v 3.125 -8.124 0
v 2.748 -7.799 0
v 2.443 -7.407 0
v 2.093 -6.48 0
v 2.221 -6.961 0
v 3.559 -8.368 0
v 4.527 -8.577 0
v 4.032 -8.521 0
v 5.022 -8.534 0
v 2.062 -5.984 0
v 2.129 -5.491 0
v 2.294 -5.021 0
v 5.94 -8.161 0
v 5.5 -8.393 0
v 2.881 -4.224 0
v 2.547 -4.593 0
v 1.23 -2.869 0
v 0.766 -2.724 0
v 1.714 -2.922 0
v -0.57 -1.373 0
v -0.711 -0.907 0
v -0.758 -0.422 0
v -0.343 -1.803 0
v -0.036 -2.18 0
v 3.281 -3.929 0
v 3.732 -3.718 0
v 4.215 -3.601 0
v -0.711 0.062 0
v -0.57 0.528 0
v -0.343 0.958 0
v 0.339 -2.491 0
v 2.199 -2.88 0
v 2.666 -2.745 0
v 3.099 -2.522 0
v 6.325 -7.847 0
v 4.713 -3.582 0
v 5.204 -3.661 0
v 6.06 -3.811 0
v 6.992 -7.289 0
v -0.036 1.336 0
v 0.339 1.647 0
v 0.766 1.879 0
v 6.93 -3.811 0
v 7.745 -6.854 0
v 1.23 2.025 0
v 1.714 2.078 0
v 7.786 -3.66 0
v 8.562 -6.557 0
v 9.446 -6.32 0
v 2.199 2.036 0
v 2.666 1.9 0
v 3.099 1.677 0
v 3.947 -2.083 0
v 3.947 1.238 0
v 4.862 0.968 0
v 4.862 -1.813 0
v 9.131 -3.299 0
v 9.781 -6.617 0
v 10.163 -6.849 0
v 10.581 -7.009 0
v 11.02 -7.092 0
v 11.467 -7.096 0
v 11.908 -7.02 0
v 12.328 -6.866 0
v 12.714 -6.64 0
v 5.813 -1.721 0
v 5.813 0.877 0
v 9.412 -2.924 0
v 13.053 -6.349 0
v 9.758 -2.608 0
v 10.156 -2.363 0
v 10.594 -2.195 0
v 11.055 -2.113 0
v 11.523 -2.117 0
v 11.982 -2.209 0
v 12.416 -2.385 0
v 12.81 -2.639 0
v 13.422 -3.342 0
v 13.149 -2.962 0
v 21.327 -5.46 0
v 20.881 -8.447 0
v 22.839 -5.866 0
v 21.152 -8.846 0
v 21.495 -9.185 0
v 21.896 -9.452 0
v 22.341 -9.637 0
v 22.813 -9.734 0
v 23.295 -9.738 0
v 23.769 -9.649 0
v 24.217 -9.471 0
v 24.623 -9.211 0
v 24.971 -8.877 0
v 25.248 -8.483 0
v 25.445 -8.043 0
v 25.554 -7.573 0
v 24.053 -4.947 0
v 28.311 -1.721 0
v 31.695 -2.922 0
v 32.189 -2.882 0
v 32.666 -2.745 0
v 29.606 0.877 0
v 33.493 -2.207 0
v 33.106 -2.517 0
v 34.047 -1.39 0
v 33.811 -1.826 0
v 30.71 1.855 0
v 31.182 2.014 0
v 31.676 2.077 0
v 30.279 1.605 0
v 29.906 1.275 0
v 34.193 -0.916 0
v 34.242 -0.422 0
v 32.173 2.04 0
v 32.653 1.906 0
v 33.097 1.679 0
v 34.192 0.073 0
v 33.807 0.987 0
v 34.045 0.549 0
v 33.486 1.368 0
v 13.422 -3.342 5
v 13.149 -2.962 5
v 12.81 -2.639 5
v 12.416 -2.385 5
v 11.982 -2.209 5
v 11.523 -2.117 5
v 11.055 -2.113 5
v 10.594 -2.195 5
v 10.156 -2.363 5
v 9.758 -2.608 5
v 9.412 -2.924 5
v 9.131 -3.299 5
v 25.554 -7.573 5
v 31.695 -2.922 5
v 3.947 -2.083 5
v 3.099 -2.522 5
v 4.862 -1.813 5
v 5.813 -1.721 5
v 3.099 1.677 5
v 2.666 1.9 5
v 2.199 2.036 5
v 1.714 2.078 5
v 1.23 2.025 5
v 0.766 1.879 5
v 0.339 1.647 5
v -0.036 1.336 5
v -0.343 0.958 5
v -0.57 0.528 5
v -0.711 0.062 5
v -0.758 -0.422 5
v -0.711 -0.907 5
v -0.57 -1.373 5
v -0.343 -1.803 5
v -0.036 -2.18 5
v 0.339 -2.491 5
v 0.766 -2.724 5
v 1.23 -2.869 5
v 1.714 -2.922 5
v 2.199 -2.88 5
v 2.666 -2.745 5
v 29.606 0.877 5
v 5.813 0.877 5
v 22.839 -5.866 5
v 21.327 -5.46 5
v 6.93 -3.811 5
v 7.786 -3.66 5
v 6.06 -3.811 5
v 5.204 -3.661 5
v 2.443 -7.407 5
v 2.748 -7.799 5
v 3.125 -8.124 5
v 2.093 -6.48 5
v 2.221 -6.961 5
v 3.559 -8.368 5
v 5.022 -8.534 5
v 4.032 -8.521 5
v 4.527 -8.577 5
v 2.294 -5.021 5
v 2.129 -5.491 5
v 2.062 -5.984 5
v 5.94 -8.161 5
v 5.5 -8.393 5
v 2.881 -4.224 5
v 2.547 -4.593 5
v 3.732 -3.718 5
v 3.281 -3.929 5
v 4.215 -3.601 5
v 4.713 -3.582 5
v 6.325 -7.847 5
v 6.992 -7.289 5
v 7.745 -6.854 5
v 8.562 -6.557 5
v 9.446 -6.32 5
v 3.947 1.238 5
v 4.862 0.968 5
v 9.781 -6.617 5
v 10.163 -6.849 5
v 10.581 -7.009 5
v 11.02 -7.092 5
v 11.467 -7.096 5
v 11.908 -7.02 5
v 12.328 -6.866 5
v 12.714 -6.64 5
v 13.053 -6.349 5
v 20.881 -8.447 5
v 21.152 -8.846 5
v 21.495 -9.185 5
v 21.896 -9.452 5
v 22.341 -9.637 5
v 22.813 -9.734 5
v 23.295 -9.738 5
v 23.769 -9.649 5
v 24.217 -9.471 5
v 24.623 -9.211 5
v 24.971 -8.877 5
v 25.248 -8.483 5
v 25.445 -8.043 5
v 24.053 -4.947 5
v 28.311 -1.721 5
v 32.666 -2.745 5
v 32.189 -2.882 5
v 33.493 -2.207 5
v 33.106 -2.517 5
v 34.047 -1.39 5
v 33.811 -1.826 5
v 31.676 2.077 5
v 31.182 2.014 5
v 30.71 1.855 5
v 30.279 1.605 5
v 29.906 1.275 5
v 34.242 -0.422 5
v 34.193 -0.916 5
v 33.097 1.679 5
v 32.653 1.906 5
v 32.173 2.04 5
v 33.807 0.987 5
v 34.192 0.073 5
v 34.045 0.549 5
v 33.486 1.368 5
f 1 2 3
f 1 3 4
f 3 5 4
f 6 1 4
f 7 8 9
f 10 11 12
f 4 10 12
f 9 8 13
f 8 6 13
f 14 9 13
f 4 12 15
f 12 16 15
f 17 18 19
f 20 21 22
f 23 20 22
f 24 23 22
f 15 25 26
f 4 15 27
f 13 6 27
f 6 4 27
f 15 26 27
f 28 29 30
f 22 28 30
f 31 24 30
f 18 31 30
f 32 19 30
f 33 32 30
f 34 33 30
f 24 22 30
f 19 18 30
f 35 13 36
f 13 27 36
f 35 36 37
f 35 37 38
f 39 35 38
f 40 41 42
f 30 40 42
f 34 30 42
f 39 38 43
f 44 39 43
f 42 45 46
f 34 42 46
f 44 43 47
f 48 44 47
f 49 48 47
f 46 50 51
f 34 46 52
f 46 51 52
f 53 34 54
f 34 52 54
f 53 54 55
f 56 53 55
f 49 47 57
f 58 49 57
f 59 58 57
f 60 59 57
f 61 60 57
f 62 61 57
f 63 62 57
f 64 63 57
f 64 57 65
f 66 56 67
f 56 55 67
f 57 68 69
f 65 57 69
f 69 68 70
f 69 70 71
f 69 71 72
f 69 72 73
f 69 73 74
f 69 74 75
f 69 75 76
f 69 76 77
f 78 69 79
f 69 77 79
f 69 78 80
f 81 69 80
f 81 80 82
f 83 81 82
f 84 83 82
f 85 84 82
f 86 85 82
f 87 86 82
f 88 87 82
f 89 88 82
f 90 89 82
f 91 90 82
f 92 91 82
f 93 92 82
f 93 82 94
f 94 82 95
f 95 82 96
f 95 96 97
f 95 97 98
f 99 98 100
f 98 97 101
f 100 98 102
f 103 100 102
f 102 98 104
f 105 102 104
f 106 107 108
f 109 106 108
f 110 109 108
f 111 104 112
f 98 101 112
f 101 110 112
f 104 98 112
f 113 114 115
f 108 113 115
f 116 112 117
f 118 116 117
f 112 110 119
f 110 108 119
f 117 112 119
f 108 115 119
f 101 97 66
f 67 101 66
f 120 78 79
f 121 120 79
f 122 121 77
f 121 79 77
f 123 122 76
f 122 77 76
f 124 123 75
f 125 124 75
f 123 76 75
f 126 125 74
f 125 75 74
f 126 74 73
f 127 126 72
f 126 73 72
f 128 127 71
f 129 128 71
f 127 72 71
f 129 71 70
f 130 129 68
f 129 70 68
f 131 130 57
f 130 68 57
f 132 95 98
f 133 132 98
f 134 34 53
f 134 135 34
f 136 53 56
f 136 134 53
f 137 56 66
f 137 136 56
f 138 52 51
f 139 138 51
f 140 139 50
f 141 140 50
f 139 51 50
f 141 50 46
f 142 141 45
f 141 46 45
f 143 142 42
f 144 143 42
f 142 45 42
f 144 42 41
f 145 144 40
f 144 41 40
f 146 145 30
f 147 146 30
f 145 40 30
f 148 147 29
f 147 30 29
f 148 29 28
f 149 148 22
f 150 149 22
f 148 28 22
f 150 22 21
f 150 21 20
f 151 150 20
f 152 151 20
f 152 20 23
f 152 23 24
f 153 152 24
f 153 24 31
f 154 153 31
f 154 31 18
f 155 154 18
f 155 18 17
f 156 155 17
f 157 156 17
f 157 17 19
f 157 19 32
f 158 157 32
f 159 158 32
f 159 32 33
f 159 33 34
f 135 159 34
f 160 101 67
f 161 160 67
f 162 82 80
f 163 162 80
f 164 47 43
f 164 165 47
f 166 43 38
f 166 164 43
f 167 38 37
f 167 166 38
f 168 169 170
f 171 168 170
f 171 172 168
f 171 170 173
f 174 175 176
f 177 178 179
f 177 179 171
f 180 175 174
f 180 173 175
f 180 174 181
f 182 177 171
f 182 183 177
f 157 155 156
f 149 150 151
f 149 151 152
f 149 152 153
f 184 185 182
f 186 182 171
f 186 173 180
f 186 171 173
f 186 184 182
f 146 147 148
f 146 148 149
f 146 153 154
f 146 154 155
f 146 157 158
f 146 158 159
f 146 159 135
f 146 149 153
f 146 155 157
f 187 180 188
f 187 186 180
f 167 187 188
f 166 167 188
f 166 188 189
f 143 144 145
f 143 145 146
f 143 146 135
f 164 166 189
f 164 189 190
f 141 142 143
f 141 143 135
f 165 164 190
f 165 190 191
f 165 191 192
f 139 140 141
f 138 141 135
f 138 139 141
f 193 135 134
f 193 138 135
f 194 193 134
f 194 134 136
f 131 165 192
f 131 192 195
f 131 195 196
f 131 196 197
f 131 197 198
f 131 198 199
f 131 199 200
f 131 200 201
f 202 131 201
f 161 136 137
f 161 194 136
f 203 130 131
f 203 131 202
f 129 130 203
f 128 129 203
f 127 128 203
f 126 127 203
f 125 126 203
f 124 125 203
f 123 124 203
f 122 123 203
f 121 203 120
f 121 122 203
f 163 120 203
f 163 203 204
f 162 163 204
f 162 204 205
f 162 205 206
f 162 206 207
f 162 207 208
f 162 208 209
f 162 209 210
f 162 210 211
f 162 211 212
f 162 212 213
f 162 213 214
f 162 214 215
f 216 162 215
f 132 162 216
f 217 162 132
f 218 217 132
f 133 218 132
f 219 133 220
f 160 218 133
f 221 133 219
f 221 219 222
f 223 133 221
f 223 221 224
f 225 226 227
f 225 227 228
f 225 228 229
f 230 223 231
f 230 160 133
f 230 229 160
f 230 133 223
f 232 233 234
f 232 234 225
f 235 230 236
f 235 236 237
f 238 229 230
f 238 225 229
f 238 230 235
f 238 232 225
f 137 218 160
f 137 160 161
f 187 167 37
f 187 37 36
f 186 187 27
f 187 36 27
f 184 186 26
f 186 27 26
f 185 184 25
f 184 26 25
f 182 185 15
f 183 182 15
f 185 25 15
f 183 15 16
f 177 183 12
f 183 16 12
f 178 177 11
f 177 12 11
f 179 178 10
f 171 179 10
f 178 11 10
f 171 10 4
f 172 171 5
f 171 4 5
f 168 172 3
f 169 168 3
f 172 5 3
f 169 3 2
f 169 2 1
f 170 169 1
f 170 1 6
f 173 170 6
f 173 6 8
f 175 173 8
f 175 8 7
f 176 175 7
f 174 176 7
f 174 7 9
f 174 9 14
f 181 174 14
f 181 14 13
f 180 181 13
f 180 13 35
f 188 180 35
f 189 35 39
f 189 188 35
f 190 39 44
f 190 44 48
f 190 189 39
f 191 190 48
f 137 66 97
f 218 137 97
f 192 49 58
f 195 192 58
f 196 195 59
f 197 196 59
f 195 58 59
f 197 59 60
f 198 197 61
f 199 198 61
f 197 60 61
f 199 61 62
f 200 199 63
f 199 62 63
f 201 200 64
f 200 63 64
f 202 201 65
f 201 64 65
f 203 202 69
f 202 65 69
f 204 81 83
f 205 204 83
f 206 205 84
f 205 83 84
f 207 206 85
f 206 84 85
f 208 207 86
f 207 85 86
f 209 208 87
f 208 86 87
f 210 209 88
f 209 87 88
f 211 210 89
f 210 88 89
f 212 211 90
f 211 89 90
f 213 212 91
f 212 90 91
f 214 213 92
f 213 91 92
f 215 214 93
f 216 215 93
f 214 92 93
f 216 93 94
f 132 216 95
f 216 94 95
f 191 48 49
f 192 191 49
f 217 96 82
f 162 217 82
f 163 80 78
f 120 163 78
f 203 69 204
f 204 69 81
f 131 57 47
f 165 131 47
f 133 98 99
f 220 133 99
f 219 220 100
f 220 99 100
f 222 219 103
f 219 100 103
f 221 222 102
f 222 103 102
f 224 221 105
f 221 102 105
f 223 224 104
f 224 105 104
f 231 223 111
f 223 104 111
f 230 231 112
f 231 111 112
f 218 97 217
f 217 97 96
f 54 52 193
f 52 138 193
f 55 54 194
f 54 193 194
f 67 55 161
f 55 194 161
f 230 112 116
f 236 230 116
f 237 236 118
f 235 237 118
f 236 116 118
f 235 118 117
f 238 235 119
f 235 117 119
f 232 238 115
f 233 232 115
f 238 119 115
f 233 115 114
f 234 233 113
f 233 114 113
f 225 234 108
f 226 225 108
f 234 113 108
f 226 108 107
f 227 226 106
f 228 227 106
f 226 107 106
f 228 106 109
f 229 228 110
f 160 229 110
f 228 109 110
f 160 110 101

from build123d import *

# Parameters (mm, degrees)
F1_DEPTH = 5
F2_DEPTH = 5
F3_R     = 5


with BuildPart() as f1:
    # F0 (on Top) → F1 (new body)
    with BuildSketch(Plane.XY):
        with BuildLine():
            ThreePointArc((3.8778323824, 0.876766336), (4.1491402261, 0.2522371821), (4.2418691481, -0.4223337609))
            ThreePointArc((4.2418691481, -0.4223337609), (4.1491402261, -1.0969047038), (3.8778323824, -1.7214338577))
            Line((3.8778323824, -1.7214338577), (28.311316439, -1.7214338577))
            Line((28.311316439, -1.7214338577), (29.302722756, -0.9705717363))
            ThreePointArc((29.302722756, -0.9705717363), (29.2748726925, -0.0174529288), (29.6059059138, 0.876766336))
            Line((29.6059059138, 0.876766336), (3.8778323824, 0.876766336))
        make_face()
        with BuildLine():
            ThreePointArc((34.2418691481, -0.4223337609), (32.4164400911, 1.9849373171), (29.6059059138, 0.876766336))
            Line((29.6059059138, 0.876766336), (31.7418691481, 0.876766336))
            Line((31.7418691481, 0.876766336), (33.5531306582, -1.5147461023))
            Line((33.5531306582, -1.5147461023), (31.6951874639, -2.921897887))
            ThreePointArc((31.6951874639, -2.921897887), (33.4930538599, -2.206528847), (34.2418691481, -0.4223337609))
        make_face()
        with BuildLine():
            Line((33.5531306582, -1.5147461023), (31.7418691481, 0.876766336))
            Line((31.7418691481, 0.876766336), (31.7418691481, -1.7214338577))
            Line((31.7418691481, -1.7214338577), (29.6059059138, -1.7214338577))
            ThreePointArc((29.6059059138, -1.7214338577), (30.4963719858, -2.5899907491), (31.6951874639, -2.921897887))
            Line((31.6951874639, -2.921897887), (33.5531306582, -1.5147461023))
        make_face()
        with BuildLine():
            Line((31.7418691481, 0.876766336), (29.6059059138, 0.876766336))
            ThreePointArc((29.6059059138, 0.876766336), (29.2748726925, -0.0174529288), (29.302722756, -0.9705717363))
            Line((29.302722756, -0.9705717363), (31.7418691481, 0.876766336))
        make_face()
        with BuildLine():
            Line((31.7418691481, -1.7214338577), (31.7418691481, 0.876766336))
            Line((31.7418691481, 0.876766336), (29.302722756, -0.9705717363))
            ThreePointArc((29.302722756, -0.9705717363), (29.4237113655, -1.358359666), (29.6059059138, -1.7214338577))
            Line((29.6059059138, -1.7214338577), (31.7418691481, -1.7214338577))
        make_face()
        with BuildLine():
            Line((29.6059059138, -1.7214338577), (28.311316439, -1.7214338577))
            Line((28.311316439, -1.7214338577), (24.0527407032, -4.9467544517))
            ThreePointArc((24.0527407032, -4.9467544517), (25.1599747934, -5.8682005046), (25.5749808252, -7.2476207279))
            ThreePointArc((25.5749808252, -7.2476207279), (25.569649156, -7.4108074897), (25.5536768898, -7.5732982052))
            Line((25.5536768898, -7.5732982052), (31.6951874639, -2.921897887))
            ThreePointArc((31.6951874639, -2.921897887), (30.4963719858, -2.5899907491), (29.6059059138, -1.7214338577))
        make_face()
        with BuildLine():
            Line((29.302722756, -0.9705717363), (28.311316439, -1.7214338577))
            Line((28.311316439, -1.7214338577), (29.6059059138, -1.7214338577))
            ThreePointArc((29.6059059138, -1.7214338577), (29.4237113655, -1.358359666), (29.302722756, -0.9705717363))
        make_face()
        with BuildLine():
            ThreePointArc((25.5749808252, -7.2476207279), (25.1599747934, -5.8682005046), (24.0527407032, -4.9467544517))
            Line((24.0527407032, -4.9467544517), (22.8393681886, -5.8657272732))
            Line((22.8393681886, -5.8657272732), (24.2570694169, -6.2455991724))
            Line((24.2570694169, -6.2455991724), (23.4806122816, -9.1433766513))
            Line((23.4806122816, -9.1433766513), (25.5536768898, -7.5732982052))
            ThreePointArc((25.5536768898, -7.5732982052), (25.569649156, -7.4108074897), (25.5749808252, -7.2476207279))
        make_face()
        with BuildLine():
            ThreePointArc((20.8814307518, -8.4469280594), (23.5344743938, -9.7050310844), (25.5536768898, -7.5732982052))
            Line((25.5536768898, -7.5732982052), (23.4806122816, -9.1433766513))
            Line((23.4806122816, -9.1433766513), (20.8814307518, -8.4469280594))
        make_face()
        with BuildLine():
            Line((21.6693507715, -6.751864213), (22.8393681886, -5.8657272732))
            Line((22.8393681886, -5.8657272732), (21.3268372671, -5.4604458343))
            ThreePointArc((21.3268372671, -5.4604458343), (20.6023291733, -6.8788473441), (20.8814307518, -8.4469280594))
            Line((20.8814307518, -8.4469280594), (23.4806122816, -9.1433766513))
            Line((23.4806122816, -9.1433766513), (21.6693507715, -6.751864213))
        make_face()
        Polygon((24.2570694169, -6.2455991724), (22.8393681886, -5.8657272732), (21.6693507715, -6.751864213), (23.4806122816, -9.1433766513), align=None)
        with BuildLine():
            ThreePointArc((20.8814307518, -8.4469280594), (20.6023291733, -6.8788473441), (21.3268372671, -5.4604458343))
            Line((21.3268372671, -5.4604458343), (13.4219767307, -3.3423448372))
            ThreePointArc((13.4219767307, -3.3423448372), (13.6767457968, -3.9504448184), (13.7636843696, -4.6040001325))
            ThreePointArc((13.7636843696, -4.6040001325), (13.5793417545, -5.5461948448), (13.0534996689, -6.3494402473))
            Line((13.0534996689, -6.3494402473), (20.8814307518, -8.4469280594))
        make_face()
        with BuildLine():
            ThreePointArc((13.7636843696, -4.6040001325), (13.6767457968, -3.9504448184), (13.4219767307, -3.3423448372))
            Line((13.4219767307, -3.3423448372), (11.4246112089, -2.8071523587))
            Line((11.4246112089, -2.8071523587), (12.1704041891, -5.5904896527))
            Line((12.1704041891, -5.5904896527), (11.1957308392, -5.8516525897))
            Line((11.1957308392, -5.8516525897), (13.0534996689, -6.3494402473))
            ThreePointArc((13.0534996689, -6.3494402473), (13.5793417545, -5.5461948448), (13.7636843696, -4.6040001325))
        make_face()
        with BuildLine():
            Line((11.4246112089, -2.8071523587), (13.4219767307, -3.3423448372))
            ThreePointArc((13.4219767307, -3.3423448372), (11.2889517228, -2.1041278236), (9.1313345982, -3.2989773541))
            Line((9.1313345982, -3.2989773541), (11.3939470538, -2.6927121739))
            Line((11.3939470538, -2.6927121739), (11.4246112089, -2.8071523587))
        make_face()
        with BuildLine():
            Line((11.2012257233, -2.7472963982), (11.4246112089, -2.8071523587))
            Line((11.4246112089, -2.8071523587), (11.3939470538, -2.6927121739))
            Line((11.3939470538, -2.6927121739), (9.1313345982, -3.2989773541))
            ThreePointArc((9.1313345982, -3.2989773541), (8.7771380409, -4.8630124006), (9.44607009, -6.3204727745))
            Line((9.44607009, -6.3204727745), (11.1957308392, -5.8516525897))
            Line((11.1957308392, -5.8516525897), (10.424768588, -5.6450738771))
            Line((10.424768588, -5.6450738771), (11.2012257233, -2.7472963982))
        make_face()
        Polygon((12.1704041891, -5.5904896527), (11.4246112089, -2.8071523587), (11.2012257233, -2.7472963982), (10.424768588, -5.6450738771), (11.1957308392, -5.8516525897), align=None)
        with BuildLine():
            ThreePointArc((9.44607009, -6.3204727745), (11.2436101462, -7.1039195363), (13.0534996689, -6.3494402473))
            Line((13.0534996689, -6.3494402473), (11.1957308392, -5.8516525897))
            Line((11.1957308392, -5.8516525897), (9.44607009, -6.3204727745))
        make_face()
        with BuildLine():
            ThreePointArc((9.44607009, -6.3204727745), (8.7771380409, -4.8630124006), (9.1313345982, -3.2989773541))
            Line((9.1313345982, -3.2989773541), (6.1034072345, -4.110308046))
            ThreePointArc((6.1034072345, -4.110308046), (6.8080120864, -4.9834588452), (7.0597841495, -6.0768348756))
            ThreePointArc((7.0597841495, -6.0768348756), (7.0143921173, -6.5510708134), (6.8798643698, -7.0080855248))
            Line((6.8798643698, -7.0080855248), (9.44607009, -6.3204727745))
        make_face()
        with BuildLine():
            Line((4.1715555819, -4.6279461362), (6.1034072345, -4.110308046))
            ThreePointArc((6.1034072345, -4.110308046), (2.1449695838, -6.7238824884), (6.8798643698, -7.0080855248))
            Line((6.8798643698, -7.0080855248), (4.9480127172, -7.525723615))
            Line((4.9480127172, -7.525723615), (4.1715555819, -4.6279461362))
        make_face()
        with BuildLine():
            ThreePointArc((7.0597841495, -6.0768348756), (6.8080120864, -4.9834588452), (6.1034072345, -4.110308046))
            Line((6.1034072345, -4.110308046), (4.1715555819, -4.6279461362))
            Line((4.1715555819, -4.6279461362), (4.9480127172, -7.525723615))
            Line((4.9480127172, -7.525723615), (6.8798643698, -7.0080855248))
            ThreePointArc((6.8798643698, -7.0080855248), (7.0143921173, -6.5510708134), (7.0597841495, -6.0768348756))
        make_face()
    extrude(amount=F1_DEPTH)

    # F0 (on Top) → F2 (join)
    with BuildSketch(Plane.XY):
        with BuildLine():
            Line((1.7418691481, 0.876766336), (3.8778323824, 0.876766336))
            ThreePointArc((3.8778323824, 0.876766336), (-0.7581308519, -0.4223337609), (3.8778323824, -1.7214338577))
            Line((3.8778323824, -1.7214338577), (1.7418691481, -1.7214338577))
            Line((1.7418691481, -1.7214338577), (1.7418691481, 0.876766336))
        make_face()
        with BuildLine():
            ThreePointArc((3.8778323824, -1.7214338577), (4.1491402261, -1.0969047038), (4.2418691481, -0.4223337609))
            ThreePointArc((4.2418691481, -0.4223337609), (4.1491402261, 0.2522371821), (3.8778323824, 0.876766336))
            Line((3.8778323824, 0.876766336), (1.7418691481, 0.876766336))
            Line((1.7418691481, 0.876766336), (1.7418691481, -1.7214338577))
            Line((1.7418691481, -1.7214338577), (3.8778323824, -1.7214338577))
        make_face()
    extrude(amount=F2_DEPTH)

    # F3
    f3_edges = [f1.edges().sort_by_distance(p)[0] for p in [
        (3.877832, 0.876766, 2.5),
        (3.877832, -1.721434, 2.5),
        (6.879864, -7.008086, 2.5),
        (6.103407, -4.110308, 2.5),
    ]]
    fillet(f3_edges, radius=F3_R)


solid = f1.part
